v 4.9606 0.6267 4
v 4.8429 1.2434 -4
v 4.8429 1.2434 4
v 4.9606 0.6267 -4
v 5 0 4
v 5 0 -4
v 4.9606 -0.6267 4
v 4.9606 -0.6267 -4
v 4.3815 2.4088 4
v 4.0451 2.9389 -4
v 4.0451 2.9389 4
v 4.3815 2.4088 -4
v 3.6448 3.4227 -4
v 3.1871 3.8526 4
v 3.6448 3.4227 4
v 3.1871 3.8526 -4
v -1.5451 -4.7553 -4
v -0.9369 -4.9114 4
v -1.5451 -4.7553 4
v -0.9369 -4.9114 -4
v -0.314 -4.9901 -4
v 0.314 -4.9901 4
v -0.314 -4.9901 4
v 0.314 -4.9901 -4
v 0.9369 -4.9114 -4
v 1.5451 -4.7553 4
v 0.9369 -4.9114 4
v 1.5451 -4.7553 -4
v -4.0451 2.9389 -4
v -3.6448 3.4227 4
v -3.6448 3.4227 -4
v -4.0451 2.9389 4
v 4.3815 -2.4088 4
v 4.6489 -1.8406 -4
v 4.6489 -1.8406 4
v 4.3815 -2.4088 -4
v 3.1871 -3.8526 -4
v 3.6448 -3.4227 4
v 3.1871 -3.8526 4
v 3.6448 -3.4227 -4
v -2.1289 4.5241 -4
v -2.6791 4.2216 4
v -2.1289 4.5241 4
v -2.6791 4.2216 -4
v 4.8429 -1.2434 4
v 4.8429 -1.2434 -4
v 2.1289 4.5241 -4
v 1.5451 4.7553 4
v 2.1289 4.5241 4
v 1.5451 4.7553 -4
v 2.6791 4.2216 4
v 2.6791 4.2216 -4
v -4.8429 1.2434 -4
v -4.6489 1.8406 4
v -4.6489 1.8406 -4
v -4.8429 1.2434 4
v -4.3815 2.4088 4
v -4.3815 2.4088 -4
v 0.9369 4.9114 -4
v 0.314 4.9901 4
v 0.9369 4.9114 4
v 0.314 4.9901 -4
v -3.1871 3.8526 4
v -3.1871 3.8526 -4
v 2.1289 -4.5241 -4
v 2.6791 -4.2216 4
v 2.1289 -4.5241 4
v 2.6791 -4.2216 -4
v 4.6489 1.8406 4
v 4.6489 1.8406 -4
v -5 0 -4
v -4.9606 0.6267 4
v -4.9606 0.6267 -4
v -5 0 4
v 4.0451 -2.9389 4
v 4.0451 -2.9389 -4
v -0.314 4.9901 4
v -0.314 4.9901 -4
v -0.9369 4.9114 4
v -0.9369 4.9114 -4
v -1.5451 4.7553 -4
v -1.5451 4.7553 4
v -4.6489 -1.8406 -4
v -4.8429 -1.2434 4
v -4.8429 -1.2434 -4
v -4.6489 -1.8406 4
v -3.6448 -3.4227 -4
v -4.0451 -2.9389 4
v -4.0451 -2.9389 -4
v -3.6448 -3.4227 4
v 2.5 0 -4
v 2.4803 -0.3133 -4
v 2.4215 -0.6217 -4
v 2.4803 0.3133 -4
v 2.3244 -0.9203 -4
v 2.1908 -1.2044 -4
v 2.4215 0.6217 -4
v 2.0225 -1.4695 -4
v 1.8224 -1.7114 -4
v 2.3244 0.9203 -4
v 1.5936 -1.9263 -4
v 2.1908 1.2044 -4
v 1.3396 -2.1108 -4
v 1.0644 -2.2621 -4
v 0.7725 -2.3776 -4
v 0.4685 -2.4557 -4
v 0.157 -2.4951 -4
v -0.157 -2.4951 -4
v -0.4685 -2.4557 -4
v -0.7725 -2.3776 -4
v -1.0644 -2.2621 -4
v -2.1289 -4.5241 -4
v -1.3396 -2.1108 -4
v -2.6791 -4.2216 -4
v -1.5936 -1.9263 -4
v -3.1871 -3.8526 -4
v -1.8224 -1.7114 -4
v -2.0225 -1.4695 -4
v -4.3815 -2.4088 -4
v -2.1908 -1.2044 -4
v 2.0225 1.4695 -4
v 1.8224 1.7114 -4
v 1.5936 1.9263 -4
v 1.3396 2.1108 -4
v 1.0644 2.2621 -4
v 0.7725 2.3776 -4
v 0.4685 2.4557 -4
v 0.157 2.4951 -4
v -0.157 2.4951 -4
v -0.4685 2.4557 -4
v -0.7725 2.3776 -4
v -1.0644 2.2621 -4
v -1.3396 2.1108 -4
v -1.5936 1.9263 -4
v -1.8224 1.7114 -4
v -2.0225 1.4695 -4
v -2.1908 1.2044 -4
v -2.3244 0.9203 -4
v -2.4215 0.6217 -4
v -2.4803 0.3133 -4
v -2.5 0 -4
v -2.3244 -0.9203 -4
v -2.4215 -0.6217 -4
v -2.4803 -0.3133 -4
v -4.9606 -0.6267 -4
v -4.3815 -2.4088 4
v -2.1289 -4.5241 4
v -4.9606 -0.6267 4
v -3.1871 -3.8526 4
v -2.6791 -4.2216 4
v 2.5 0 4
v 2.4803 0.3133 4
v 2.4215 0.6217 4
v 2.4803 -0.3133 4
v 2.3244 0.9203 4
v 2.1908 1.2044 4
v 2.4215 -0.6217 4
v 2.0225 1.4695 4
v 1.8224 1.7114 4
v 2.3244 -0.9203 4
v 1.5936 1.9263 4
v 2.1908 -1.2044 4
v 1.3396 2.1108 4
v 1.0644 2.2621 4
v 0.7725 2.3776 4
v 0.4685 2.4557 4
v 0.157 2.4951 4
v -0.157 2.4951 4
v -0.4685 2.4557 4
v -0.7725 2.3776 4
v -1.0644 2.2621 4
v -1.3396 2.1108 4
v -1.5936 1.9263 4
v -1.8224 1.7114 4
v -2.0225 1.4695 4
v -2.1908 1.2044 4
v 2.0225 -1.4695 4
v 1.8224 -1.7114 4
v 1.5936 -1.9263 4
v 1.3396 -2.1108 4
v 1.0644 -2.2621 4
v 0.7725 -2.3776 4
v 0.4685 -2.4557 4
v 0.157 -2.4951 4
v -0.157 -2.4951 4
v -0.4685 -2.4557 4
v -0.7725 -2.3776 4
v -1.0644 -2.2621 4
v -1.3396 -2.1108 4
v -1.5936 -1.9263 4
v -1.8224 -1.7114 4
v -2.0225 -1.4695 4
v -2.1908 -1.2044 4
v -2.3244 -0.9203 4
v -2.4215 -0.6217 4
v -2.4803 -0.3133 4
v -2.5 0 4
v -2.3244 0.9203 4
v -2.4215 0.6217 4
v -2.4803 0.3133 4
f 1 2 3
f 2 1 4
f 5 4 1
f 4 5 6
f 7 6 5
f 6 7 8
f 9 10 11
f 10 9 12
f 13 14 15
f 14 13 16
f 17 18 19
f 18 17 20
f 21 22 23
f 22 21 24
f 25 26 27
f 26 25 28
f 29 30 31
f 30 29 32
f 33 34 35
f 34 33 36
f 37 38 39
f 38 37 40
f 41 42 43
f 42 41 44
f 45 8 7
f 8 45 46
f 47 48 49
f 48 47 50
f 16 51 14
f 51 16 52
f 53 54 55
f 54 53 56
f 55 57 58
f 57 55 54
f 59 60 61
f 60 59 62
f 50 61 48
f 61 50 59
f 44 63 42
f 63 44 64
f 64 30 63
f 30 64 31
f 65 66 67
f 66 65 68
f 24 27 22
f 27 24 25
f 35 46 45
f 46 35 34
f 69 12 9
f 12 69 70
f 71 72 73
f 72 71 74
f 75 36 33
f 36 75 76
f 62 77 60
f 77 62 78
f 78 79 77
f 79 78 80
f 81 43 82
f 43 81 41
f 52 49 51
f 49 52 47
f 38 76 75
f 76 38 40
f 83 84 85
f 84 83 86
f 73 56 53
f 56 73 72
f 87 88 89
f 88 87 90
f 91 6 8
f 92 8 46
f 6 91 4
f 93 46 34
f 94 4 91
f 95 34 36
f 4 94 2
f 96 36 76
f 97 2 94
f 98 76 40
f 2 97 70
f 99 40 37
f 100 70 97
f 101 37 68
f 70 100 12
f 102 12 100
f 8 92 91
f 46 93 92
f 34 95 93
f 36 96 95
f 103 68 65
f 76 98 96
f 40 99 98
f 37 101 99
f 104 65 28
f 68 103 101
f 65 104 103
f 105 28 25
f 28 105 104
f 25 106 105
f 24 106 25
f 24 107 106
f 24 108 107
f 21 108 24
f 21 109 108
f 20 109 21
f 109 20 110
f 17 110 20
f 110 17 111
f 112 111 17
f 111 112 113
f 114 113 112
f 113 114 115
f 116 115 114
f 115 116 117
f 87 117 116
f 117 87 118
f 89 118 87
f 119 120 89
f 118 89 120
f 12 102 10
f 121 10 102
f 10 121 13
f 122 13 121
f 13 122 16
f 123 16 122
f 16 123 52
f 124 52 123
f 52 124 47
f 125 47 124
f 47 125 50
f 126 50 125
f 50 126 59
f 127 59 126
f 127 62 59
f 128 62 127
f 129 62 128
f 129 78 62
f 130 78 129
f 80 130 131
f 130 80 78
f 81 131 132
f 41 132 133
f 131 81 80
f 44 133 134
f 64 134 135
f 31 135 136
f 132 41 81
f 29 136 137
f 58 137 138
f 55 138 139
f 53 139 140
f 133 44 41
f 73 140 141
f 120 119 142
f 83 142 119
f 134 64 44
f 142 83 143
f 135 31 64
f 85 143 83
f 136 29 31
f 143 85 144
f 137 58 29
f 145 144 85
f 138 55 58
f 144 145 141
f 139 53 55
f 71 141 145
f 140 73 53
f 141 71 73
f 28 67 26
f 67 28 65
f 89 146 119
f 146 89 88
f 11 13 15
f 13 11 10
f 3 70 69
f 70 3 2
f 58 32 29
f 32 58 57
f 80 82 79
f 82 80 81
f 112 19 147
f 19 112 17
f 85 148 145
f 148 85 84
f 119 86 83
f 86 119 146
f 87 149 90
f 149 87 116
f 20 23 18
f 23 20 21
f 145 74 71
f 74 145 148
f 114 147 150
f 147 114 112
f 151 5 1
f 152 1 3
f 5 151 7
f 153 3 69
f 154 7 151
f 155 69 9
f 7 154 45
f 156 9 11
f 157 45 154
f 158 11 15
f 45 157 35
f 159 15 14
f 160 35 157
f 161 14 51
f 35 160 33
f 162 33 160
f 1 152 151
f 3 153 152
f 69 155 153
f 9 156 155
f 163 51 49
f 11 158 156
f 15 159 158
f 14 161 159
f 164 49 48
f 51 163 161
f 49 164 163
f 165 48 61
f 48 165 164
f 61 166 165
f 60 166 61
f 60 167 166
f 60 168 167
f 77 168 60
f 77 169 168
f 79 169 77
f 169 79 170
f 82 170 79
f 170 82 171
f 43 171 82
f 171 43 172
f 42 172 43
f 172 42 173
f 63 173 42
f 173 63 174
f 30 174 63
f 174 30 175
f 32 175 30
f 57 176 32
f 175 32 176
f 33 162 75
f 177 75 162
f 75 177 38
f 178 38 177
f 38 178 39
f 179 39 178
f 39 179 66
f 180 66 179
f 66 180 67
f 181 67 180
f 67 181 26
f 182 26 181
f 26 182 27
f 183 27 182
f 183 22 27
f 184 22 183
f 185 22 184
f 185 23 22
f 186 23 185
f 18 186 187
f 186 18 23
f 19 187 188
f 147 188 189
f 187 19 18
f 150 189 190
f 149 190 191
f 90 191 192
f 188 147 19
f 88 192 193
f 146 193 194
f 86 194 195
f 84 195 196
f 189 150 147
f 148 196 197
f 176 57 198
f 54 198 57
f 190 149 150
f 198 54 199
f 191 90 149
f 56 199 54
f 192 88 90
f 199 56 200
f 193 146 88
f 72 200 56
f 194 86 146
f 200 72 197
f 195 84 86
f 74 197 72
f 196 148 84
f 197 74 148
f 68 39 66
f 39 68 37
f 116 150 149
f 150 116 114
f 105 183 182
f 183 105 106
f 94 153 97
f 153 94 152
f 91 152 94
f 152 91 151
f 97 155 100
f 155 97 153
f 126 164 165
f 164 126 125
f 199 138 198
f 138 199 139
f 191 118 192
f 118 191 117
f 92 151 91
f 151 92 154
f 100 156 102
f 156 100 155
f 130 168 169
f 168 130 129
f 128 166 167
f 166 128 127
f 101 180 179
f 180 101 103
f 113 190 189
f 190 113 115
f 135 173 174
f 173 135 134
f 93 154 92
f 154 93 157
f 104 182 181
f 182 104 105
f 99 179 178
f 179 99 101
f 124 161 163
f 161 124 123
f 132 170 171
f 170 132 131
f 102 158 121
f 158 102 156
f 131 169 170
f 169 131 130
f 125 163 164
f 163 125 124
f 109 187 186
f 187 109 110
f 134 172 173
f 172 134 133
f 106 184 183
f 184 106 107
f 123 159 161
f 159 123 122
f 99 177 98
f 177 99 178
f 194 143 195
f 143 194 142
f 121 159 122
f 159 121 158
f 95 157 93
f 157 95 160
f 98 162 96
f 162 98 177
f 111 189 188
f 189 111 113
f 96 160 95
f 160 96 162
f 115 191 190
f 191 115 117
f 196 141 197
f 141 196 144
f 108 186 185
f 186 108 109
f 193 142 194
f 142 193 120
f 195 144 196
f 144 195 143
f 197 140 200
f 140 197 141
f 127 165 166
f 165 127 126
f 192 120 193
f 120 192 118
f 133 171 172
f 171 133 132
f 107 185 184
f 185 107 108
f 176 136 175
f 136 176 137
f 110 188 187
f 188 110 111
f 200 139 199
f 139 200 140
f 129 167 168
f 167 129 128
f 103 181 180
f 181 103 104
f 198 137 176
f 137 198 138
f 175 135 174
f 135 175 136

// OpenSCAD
$fn = 50;


difference() {
	union() {
		translate(v = [0, 0, -4.0000000000]) {
			cylinder(h = 8, r = 5.0000000000);
		}
	}
	union() {
		translate(v = [0, 0, -100.0000000000]) {
			cylinder(h = 200, r = 2.5000000000);
		}
	}
}
